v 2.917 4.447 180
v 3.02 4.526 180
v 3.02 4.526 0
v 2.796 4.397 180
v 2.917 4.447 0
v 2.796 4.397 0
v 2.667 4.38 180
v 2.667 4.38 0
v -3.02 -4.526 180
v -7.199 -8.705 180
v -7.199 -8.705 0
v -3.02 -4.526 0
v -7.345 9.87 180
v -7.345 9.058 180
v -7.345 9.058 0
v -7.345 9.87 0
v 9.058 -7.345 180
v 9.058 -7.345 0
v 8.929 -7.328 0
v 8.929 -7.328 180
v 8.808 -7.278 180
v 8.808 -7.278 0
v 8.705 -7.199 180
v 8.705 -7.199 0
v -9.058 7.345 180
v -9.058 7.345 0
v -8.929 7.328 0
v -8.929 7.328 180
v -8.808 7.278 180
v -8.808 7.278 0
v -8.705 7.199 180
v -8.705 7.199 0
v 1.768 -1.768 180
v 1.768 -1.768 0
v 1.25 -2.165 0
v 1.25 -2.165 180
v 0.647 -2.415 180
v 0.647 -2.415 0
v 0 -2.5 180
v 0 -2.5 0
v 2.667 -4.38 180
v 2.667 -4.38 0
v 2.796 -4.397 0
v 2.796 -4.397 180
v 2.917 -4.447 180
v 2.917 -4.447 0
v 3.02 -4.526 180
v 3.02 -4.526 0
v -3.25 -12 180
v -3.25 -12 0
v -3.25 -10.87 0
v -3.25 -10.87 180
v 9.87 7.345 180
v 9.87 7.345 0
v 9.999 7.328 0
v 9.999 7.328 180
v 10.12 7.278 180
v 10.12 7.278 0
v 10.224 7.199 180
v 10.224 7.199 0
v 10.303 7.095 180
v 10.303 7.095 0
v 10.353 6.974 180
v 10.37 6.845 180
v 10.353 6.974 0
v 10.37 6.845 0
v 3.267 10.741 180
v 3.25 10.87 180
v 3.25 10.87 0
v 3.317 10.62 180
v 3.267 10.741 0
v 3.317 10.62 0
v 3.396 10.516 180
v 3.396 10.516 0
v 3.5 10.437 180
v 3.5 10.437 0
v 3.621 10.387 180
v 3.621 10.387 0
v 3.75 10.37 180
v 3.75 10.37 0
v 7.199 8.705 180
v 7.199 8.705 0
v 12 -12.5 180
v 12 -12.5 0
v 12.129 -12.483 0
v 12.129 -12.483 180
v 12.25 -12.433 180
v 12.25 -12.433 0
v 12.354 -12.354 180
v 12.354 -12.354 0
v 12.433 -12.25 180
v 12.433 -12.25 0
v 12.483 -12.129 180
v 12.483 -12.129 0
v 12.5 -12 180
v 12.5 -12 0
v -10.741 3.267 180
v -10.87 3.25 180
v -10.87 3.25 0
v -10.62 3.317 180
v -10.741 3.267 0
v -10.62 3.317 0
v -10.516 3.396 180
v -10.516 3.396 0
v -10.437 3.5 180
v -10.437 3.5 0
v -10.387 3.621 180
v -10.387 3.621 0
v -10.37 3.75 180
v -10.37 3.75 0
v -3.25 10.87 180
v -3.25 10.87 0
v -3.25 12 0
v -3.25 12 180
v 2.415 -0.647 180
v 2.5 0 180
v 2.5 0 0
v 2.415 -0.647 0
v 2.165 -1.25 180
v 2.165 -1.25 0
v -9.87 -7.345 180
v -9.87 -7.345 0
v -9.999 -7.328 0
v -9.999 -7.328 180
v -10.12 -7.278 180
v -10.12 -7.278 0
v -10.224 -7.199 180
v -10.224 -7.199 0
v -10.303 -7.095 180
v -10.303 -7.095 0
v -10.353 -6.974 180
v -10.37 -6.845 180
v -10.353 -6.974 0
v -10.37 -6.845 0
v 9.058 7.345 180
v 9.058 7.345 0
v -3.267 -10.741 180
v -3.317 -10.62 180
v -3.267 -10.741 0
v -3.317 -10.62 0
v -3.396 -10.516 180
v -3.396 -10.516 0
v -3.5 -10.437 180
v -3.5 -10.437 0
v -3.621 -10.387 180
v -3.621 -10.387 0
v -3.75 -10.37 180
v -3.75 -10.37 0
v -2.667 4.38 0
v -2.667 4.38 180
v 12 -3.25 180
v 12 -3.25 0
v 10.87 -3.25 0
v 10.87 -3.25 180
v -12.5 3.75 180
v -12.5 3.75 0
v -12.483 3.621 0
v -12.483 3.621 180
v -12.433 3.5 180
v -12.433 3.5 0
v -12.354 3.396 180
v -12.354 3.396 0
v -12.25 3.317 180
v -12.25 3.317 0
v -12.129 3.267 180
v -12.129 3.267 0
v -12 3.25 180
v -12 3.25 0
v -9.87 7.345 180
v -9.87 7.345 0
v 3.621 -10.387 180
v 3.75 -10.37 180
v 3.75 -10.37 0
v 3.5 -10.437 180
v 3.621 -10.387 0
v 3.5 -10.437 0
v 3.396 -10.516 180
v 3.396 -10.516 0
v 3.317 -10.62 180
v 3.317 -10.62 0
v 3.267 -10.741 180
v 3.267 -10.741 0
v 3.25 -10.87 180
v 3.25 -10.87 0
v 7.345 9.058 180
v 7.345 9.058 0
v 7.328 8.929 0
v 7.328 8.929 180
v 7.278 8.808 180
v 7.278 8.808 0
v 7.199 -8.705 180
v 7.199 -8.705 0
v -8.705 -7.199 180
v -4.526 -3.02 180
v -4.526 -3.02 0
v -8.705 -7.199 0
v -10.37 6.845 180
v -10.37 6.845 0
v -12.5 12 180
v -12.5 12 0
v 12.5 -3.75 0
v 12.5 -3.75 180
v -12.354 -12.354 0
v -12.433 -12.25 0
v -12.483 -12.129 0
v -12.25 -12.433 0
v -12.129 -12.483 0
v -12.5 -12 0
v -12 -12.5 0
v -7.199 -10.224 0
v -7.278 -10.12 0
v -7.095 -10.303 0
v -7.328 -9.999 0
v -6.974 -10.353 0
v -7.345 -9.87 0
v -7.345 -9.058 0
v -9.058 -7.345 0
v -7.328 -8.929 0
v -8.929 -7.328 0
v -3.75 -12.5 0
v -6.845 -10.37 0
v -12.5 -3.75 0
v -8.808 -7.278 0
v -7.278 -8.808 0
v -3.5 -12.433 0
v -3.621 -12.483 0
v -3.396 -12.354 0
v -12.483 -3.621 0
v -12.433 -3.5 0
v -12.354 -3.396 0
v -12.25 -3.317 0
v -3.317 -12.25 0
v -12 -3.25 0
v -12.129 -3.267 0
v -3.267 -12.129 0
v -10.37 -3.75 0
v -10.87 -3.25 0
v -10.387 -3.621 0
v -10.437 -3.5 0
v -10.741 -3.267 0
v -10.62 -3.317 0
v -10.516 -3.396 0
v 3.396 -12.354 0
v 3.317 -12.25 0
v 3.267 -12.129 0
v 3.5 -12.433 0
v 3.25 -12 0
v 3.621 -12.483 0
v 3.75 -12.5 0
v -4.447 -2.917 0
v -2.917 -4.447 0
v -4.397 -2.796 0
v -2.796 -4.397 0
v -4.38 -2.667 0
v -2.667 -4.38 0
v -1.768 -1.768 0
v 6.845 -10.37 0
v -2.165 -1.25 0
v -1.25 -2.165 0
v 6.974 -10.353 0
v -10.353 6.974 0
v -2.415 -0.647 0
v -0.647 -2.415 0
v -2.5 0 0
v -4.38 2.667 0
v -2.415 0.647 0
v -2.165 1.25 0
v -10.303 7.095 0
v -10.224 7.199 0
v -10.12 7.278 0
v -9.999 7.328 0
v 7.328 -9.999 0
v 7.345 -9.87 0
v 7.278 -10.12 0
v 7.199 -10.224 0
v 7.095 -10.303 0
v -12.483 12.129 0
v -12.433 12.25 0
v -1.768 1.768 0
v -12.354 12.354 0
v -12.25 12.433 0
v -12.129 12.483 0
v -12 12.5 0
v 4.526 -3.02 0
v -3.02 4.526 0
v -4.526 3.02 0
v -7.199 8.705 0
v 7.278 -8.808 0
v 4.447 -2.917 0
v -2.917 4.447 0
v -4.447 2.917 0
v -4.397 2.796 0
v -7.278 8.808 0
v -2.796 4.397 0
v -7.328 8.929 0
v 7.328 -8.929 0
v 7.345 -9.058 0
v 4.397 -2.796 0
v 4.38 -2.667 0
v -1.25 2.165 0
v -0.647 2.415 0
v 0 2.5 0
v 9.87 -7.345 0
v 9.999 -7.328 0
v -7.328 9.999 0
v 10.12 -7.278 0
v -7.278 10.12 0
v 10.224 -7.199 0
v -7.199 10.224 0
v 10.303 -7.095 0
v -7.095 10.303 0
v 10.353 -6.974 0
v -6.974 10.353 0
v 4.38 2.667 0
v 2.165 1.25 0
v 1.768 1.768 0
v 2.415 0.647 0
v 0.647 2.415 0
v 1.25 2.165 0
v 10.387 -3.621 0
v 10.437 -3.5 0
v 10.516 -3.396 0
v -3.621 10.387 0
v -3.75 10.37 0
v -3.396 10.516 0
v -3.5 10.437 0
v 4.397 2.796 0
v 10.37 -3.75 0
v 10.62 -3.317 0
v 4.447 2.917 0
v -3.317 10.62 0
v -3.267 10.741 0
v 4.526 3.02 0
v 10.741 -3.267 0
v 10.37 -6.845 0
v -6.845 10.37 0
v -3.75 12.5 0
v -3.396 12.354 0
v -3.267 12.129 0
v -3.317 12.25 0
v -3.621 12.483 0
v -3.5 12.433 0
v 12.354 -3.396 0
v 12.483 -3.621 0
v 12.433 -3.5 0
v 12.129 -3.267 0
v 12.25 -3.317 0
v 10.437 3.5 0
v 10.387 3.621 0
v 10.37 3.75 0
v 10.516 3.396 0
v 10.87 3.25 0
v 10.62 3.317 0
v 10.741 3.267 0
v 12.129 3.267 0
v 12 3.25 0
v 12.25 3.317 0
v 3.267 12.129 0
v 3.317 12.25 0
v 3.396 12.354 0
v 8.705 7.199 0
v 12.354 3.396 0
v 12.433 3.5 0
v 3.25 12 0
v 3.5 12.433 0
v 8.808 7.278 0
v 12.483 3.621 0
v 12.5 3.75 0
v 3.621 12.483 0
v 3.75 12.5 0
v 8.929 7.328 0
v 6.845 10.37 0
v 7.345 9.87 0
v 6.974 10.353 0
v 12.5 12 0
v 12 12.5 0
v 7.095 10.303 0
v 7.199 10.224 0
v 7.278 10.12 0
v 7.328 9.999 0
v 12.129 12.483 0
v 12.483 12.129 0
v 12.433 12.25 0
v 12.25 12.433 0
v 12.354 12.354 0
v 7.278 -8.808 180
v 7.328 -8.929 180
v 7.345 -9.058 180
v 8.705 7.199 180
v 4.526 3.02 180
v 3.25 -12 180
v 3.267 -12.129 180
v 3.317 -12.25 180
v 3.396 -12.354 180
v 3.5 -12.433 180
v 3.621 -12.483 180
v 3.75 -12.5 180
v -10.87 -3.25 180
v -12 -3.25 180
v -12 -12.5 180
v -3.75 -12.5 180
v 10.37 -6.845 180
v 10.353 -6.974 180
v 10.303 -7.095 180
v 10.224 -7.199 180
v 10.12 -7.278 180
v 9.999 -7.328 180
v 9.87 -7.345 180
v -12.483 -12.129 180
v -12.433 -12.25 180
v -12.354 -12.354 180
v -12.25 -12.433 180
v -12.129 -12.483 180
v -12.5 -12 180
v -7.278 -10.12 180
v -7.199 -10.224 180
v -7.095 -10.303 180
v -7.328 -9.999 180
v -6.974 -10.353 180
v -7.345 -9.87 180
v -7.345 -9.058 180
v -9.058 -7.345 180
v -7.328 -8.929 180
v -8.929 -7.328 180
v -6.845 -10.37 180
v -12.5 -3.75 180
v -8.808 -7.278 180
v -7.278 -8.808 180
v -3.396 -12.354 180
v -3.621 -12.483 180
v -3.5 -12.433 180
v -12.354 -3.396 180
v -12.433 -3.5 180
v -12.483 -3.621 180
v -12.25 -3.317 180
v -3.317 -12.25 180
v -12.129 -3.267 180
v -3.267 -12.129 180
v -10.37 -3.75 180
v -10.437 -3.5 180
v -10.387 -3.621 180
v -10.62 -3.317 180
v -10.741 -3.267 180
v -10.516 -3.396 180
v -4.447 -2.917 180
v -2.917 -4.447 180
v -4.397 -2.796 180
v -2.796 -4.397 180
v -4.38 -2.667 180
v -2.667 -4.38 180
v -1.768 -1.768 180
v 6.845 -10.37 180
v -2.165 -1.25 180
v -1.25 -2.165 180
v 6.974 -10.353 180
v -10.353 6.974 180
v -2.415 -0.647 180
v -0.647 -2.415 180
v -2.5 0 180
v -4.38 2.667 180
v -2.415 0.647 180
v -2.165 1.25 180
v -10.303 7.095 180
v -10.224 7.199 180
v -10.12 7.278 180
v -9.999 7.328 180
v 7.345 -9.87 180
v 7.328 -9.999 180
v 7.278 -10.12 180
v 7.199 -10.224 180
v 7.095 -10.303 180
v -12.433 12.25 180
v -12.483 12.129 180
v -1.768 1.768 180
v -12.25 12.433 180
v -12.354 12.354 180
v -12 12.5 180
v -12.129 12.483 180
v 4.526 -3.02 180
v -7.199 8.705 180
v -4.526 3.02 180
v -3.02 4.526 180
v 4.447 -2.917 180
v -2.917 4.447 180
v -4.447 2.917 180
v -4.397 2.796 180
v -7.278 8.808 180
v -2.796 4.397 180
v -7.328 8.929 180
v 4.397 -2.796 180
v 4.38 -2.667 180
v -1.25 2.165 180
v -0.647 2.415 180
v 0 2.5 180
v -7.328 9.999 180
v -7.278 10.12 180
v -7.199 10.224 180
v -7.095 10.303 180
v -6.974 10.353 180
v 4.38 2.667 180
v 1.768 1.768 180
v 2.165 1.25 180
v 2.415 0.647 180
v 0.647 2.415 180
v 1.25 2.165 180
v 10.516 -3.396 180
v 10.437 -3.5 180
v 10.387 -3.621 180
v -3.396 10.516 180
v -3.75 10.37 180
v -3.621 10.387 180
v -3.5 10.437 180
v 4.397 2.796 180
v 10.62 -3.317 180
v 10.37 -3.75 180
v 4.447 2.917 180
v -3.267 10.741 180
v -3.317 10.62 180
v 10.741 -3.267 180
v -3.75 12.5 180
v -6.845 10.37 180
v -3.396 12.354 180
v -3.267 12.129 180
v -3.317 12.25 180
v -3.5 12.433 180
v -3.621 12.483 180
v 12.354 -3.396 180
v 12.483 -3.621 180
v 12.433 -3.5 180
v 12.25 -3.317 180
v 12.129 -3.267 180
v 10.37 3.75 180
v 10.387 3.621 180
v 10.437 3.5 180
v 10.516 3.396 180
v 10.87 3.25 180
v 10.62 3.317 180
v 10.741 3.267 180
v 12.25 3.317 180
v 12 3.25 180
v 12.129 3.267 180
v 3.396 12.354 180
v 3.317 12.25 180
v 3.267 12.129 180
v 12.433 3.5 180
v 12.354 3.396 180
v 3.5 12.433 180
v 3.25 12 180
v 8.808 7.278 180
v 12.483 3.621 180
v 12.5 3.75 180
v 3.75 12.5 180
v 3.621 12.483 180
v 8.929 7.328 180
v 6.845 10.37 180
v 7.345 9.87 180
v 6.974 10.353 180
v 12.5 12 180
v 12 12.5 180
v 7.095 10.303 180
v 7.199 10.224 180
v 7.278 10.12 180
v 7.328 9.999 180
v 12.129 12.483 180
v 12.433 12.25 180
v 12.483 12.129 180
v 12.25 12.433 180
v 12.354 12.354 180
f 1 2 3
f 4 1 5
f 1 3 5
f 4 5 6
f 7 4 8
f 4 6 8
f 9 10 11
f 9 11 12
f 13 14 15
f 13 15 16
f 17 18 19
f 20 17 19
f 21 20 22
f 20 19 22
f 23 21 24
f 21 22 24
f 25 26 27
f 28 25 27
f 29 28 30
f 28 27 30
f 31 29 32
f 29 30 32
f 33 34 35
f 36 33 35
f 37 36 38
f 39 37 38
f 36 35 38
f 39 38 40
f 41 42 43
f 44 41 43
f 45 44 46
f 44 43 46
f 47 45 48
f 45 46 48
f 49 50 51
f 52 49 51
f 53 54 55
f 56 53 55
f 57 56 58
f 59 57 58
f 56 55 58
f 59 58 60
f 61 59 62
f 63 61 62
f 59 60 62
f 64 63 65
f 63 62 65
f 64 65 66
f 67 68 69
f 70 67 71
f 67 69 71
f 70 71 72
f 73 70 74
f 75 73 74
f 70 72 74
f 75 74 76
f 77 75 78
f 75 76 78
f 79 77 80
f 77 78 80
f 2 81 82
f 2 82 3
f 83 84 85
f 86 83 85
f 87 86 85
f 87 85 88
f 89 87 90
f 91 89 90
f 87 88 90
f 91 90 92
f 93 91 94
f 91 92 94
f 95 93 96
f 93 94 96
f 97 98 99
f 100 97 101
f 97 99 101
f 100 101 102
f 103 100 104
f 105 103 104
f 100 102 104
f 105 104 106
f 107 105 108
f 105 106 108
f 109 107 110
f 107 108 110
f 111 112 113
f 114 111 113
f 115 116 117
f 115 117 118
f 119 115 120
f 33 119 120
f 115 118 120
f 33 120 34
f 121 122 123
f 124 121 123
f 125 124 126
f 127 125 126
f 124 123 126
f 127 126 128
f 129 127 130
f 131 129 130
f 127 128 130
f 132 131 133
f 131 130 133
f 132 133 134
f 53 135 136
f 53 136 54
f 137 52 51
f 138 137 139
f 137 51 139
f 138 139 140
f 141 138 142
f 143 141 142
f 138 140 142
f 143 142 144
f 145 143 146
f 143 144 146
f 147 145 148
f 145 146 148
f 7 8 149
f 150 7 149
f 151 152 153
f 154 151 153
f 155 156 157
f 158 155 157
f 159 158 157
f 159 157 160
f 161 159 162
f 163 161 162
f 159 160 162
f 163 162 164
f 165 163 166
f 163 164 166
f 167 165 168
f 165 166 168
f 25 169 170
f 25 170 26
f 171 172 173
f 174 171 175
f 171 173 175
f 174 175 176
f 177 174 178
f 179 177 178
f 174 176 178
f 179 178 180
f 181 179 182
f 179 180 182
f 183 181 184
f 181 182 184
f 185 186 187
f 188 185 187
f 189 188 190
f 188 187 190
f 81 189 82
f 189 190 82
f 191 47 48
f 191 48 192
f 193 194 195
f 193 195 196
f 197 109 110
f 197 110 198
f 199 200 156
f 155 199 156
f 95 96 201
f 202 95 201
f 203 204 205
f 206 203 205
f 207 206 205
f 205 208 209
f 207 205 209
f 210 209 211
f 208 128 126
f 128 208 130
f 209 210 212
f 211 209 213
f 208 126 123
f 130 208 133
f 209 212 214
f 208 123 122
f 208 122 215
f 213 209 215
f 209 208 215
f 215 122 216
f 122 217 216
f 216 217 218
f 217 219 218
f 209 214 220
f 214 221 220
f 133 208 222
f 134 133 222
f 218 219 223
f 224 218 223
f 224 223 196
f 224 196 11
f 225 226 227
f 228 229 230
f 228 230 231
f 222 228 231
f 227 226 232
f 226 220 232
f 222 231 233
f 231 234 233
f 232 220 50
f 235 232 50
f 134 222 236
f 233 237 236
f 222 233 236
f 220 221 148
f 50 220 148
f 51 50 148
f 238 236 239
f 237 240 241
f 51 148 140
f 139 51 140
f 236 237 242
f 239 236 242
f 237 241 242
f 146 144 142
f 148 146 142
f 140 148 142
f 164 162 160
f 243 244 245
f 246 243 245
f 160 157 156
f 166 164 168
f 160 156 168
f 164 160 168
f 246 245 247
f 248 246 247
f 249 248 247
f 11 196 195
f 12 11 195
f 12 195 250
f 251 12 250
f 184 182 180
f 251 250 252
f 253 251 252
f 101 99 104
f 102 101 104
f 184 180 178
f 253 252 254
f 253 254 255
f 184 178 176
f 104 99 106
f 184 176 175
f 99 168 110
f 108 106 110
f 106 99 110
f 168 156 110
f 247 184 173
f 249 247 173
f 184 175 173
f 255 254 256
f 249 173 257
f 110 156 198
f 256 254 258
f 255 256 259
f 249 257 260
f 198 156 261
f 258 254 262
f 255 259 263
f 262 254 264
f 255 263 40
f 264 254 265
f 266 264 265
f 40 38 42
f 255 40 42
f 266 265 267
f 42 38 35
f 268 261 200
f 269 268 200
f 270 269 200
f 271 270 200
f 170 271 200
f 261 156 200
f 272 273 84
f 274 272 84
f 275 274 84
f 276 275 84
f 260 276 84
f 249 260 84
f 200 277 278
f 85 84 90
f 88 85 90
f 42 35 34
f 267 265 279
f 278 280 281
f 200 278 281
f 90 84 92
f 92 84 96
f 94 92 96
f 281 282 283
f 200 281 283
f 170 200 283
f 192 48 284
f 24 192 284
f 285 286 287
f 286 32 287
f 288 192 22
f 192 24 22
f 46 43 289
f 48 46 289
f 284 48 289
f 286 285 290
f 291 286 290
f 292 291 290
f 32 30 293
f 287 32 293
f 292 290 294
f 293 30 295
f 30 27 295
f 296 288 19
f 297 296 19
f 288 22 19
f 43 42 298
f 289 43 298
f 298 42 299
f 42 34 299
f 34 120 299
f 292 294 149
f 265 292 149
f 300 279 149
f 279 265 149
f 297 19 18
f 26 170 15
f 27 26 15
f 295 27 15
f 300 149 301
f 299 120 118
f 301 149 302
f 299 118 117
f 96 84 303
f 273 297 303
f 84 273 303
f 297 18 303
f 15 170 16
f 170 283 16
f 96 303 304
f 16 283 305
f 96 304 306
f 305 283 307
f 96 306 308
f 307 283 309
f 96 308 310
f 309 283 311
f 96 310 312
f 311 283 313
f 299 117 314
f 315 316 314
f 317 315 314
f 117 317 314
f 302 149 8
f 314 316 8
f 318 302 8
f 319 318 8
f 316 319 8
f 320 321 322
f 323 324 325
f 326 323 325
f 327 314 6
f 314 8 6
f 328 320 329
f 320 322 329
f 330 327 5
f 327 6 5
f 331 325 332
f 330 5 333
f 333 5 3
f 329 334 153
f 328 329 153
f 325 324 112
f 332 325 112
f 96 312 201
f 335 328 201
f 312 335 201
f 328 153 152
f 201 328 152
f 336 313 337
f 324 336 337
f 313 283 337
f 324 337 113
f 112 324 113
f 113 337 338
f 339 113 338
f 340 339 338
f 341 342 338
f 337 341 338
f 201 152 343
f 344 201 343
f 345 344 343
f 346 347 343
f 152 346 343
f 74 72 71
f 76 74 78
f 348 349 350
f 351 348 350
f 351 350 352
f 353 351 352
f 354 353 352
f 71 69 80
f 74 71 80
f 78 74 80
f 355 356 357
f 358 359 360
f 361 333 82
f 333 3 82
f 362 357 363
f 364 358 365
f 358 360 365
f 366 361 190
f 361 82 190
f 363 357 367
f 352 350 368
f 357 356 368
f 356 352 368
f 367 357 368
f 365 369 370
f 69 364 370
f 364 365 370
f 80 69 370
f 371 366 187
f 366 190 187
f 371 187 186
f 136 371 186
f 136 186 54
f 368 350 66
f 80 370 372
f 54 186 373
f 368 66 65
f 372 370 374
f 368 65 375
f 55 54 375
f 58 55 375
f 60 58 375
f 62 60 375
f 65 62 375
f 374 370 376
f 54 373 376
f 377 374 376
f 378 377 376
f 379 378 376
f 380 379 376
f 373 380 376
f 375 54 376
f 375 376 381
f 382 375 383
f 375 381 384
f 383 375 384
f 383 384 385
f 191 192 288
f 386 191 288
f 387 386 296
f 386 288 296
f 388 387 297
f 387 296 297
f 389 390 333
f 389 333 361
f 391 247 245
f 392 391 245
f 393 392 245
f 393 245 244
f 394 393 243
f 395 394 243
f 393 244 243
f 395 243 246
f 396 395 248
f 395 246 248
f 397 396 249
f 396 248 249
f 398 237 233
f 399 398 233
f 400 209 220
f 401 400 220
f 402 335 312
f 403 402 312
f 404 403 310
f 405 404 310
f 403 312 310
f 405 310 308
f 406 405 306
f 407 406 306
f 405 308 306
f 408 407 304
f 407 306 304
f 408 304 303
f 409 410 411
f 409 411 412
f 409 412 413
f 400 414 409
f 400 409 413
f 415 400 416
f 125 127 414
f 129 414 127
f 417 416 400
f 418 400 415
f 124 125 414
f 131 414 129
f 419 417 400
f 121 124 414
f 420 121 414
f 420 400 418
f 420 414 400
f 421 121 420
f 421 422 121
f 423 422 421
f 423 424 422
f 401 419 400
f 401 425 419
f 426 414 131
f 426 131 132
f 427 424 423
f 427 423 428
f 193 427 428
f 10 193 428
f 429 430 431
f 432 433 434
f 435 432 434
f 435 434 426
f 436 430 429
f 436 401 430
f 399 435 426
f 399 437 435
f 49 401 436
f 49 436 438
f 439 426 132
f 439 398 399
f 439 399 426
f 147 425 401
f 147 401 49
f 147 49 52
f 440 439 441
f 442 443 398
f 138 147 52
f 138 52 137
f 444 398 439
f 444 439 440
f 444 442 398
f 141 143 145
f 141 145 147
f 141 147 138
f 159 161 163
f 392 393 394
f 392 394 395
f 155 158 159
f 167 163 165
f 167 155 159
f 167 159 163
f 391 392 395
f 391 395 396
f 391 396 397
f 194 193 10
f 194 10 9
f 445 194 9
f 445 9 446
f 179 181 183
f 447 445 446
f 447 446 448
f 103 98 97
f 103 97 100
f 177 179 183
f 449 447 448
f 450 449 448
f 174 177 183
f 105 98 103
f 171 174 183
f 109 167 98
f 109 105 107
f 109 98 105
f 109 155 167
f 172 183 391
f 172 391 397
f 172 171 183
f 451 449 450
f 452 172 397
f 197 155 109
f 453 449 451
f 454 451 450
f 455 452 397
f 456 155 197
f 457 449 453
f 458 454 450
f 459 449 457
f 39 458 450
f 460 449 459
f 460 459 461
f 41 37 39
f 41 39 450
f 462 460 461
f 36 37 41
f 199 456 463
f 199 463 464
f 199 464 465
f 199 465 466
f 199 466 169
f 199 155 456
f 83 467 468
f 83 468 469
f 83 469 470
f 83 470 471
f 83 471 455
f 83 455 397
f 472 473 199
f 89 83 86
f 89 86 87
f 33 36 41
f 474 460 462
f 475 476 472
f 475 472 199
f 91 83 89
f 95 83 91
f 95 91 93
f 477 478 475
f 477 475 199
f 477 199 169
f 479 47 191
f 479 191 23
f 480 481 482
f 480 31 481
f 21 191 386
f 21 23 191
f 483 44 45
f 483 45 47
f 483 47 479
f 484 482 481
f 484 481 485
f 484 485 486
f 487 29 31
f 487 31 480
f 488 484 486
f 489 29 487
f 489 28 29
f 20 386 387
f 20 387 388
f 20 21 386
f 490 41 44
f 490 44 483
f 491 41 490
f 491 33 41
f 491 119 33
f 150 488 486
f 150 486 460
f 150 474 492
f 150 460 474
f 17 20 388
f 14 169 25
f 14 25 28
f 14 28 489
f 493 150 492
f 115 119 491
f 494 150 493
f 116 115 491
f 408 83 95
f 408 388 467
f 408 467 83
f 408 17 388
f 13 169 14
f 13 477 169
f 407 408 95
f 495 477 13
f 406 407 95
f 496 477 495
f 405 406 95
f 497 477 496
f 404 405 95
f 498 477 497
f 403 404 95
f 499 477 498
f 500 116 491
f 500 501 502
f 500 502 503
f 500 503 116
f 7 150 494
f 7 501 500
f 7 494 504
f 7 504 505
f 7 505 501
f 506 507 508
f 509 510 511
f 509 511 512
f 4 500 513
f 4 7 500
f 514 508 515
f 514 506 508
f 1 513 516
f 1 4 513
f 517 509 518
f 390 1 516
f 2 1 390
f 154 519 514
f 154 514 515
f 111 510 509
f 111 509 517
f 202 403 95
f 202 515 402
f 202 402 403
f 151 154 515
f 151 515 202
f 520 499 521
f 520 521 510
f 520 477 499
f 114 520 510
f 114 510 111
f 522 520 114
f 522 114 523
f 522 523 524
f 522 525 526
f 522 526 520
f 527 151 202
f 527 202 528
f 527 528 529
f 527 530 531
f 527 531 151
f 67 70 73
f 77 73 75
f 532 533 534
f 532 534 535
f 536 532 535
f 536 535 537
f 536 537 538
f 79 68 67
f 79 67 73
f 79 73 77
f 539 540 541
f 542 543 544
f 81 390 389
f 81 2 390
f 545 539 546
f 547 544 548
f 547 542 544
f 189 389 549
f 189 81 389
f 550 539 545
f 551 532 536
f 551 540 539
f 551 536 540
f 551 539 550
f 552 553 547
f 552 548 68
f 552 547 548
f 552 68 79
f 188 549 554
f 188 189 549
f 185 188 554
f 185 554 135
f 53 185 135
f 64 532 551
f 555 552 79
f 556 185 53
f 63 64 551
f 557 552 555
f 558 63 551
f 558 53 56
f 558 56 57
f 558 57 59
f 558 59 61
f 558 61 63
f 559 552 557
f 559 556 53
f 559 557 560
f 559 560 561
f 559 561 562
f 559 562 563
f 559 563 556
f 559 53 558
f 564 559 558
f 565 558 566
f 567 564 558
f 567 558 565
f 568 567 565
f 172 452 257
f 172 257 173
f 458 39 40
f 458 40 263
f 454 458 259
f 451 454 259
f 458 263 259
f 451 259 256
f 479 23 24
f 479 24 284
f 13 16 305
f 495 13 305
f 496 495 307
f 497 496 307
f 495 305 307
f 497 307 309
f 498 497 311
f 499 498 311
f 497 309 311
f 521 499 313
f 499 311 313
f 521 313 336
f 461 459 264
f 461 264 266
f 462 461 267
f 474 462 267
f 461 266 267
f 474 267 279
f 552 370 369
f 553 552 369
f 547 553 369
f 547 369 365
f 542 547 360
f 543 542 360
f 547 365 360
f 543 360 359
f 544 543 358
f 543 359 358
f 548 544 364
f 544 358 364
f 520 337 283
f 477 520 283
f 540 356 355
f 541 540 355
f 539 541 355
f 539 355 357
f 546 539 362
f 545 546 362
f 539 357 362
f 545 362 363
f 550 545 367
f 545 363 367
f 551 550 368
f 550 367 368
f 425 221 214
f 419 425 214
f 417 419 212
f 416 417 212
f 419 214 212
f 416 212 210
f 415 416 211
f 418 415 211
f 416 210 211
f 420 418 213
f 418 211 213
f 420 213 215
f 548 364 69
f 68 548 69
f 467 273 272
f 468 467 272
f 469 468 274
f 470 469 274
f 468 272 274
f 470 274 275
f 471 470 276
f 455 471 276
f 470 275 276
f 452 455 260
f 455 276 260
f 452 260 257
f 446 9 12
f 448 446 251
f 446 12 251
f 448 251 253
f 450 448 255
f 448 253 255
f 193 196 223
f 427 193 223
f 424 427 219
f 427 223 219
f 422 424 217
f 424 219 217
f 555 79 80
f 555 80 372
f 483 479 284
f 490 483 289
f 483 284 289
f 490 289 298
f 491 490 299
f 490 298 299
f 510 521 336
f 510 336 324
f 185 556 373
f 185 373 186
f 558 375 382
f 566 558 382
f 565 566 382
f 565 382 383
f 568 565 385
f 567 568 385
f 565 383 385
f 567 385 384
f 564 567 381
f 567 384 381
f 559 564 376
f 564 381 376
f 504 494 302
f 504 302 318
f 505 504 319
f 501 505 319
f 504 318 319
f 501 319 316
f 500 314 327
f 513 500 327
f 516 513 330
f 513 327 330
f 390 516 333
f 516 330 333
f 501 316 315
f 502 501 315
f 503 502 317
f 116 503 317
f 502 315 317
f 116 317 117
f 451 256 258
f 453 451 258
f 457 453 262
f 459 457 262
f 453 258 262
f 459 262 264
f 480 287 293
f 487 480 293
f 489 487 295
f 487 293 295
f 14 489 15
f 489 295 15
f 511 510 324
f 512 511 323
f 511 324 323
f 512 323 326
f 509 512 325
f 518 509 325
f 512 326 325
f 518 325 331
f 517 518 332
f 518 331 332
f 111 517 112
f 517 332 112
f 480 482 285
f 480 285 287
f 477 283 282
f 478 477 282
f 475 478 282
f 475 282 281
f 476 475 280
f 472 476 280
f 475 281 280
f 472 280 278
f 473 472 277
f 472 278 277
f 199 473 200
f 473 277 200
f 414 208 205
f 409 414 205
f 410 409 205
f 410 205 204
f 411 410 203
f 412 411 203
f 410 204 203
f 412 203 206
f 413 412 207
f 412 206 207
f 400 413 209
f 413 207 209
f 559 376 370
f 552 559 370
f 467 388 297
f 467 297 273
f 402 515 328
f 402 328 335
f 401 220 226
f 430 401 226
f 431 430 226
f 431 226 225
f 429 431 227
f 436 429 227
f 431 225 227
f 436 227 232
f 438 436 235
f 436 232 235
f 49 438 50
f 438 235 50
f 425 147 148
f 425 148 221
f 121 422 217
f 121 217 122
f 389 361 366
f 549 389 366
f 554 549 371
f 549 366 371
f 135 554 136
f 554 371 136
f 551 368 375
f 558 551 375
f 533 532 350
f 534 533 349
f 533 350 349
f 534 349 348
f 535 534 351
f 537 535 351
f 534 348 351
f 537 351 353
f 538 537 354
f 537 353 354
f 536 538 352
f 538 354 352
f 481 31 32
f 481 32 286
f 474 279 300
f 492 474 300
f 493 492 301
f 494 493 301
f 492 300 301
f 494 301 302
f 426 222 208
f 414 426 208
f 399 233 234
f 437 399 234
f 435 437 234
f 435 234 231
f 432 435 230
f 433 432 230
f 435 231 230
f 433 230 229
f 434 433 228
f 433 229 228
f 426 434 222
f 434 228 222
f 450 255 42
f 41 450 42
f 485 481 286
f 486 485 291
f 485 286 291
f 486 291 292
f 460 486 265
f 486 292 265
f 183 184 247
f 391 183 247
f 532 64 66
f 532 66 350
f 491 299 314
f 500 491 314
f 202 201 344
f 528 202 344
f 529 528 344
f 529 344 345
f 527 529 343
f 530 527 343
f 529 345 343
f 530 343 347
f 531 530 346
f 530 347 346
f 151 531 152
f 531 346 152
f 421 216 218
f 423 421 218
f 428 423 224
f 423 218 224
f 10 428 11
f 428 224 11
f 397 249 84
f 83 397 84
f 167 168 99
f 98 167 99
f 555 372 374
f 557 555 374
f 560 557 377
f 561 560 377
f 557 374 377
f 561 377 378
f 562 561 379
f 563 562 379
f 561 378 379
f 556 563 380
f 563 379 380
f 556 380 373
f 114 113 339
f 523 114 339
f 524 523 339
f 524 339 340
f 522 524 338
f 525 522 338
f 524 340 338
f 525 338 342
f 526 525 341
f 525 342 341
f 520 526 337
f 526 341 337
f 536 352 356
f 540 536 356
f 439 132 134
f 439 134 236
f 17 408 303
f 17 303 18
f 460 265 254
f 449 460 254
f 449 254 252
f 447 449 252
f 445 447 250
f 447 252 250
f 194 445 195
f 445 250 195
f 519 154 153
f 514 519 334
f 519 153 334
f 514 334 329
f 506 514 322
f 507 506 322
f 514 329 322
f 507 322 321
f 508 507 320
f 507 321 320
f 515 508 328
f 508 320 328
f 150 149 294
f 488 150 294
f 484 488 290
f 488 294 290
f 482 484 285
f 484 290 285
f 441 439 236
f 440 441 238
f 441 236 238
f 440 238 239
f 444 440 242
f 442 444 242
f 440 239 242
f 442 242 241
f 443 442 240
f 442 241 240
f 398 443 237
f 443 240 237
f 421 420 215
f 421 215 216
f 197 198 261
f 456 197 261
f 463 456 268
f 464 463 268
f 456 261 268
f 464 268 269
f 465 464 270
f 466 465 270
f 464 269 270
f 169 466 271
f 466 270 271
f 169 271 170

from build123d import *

# Parameters (mm, degrees)
F1_DEPTH = 180


with BuildPart() as f1:
    # F0 (on Top) → F1 (new body)
    with BuildSketch(Plane.XY):
        with BuildLine():
            Line((-3.75, 12.5), (-12, 12.5))
            ThreePointArc((-12, 12.5), (-12.353553, 12.353553), (-12.5, 12))
            Line((-12.5, 12), (-12.5, 3.75))
            ThreePointArc((-12.5, 3.75), (-12.353553, 3.396447), (-12, 3.25))
            Line((-12, 3.25), (-10.87, 3.25))
            ThreePointArc((-10.87, 3.25), (-10.516447, 3.396447), (-10.37, 3.75))
            Line((-10.37, 3.75), (-10.37, 6.845))
            ThreePointArc((-10.37, 6.845), (-10.223553, 7.198553), (-9.87, 7.345))
            Line((-9.87, 7.345), (-9.058244, 7.345))
            ThreePointArc((-9.058244, 7.345), (-8.866903, 7.30694), (-8.704691, 7.198553))
            Line((-8.704691, 7.198553), (-4.526447, 3.020309))
            ThreePointArc((-4.526447, 3.020309), (-4.41806, 2.858097), (-4.38, 2.666756))
            Line((-4.38, 2.666756), (-4.38, 0))
            Line((-4.38, 0), (-4.38, -2.666756))
            ThreePointArc((-4.38, -2.666756), (-4.41806, -2.858097), (-4.526447, -3.020309))
            Line((-4.526447, -3.020309), (-8.704691, -7.198553))
            ThreePointArc((-8.704691, -7.198553), (-8.866903, -7.30694), (-9.058244, -7.345))
            Line((-9.058244, -7.345), (-9.87, -7.345))
            ThreePointArc((-9.87, -7.345), (-10.223553, -7.198553), (-10.37, -6.845))
            Line((-10.37, -6.845), (-10.37, -3.75))
            ThreePointArc((-10.37, -3.75), (-10.516447, -3.396447), (-10.87, -3.25))
            Line((-10.87, -3.25), (-12, -3.25))
            ThreePointArc((-12, -3.25), (-12.353553, -3.396447), (-12.5, -3.75))
            Line((-12.5, -3.75), (-12.5, -12))
            ThreePointArc((-12.5, -12), (-12.353553, -12.353553), (-12, -12.5))
            Line((-12, -12.5), (-3.75, -12.5))
            ThreePointArc((-3.75, -12.5), (-3.396447, -12.353553), (-3.25, -12))
            Line((-3.25, -12), (-3.25, -10.87))
            ThreePointArc((-3.25, -10.87), (-3.396447, -10.516447), (-3.75, -10.37))
            Line((-3.75, -10.37), (-6.845, -10.37))
            ThreePointArc((-6.845, -10.37), (-7.198553, -10.223553), (-7.345, -9.87))
            Line((-7.345, -9.87), (-7.345, -9.058244))
            ThreePointArc((-7.345, -9.058244), (-7.30694, -8.866903), (-7.198553, -8.704691))
            Line((-7.198553, -8.704691), (-3.020309, -4.526447))
            ThreePointArc((-3.020309, -4.526447), (-2.858097, -4.41806), (-2.666756, -4.38))
            Line((-2.666756, -4.38), (0, -4.38))
            Line((0, -4.38), (2.666756, -4.38))
            ThreePointArc((2.666756, -4.38), (2.858097, -4.41806), (3.020309, -4.526447))
            Line((3.020309, -4.526447), (7.198553, -8.704691))
            ThreePointArc((7.198553, -8.704691), (7.30694, -8.866903), (7.345, -9.058244))
            Line((7.345, -9.058244), (7.345, -9.87))
            ThreePointArc((7.345, -9.87), (7.198553, -10.223553), (6.845, -10.37))
            Line((6.845, -10.37), (3.75, -10.37))
            ThreePointArc((3.75, -10.37), (3.396447, -10.516447), (3.25, -10.87))
            Line((3.25, -10.87), (3.25, -12))
            ThreePointArc((3.25, -12), (3.396447, -12.353553), (3.75, -12.5))
            Line((3.75, -12.5), (12, -12.5))
            ThreePointArc((12, -12.5), (12.353553, -12.353553), (12.5, -12))
            Line((12.5, -12), (12.5, -3.75))
            ThreePointArc((12.5, -3.75), (12.353553, -3.396447), (12, -3.25))
            Line((12, -3.25), (10.87, -3.25))
            ThreePointArc((10.87, -3.25), (10.516447, -3.396447), (10.37, -3.75))
            Line((10.37, -3.75), (10.37, -6.845))
            ThreePointArc((10.37, -6.845), (10.223553, -7.198553), (9.87, -7.345))
            Line((9.87, -7.345), (9.058244, -7.345))
            ThreePointArc((9.058244, -7.345), (8.866903, -7.30694), (8.704691, -7.198553))
            Line((8.704691, -7.198553), (4.526447, -3.020309))
            ThreePointArc((4.526447, -3.020309), (4.41806, -2.858097), (4.38, -2.666756))
            Line((4.38, -2.666756), (4.38, 0))
            Line((4.38, 0), (4.38, 2.666756))
            ThreePointArc((4.38, 2.666756), (4.41806, 2.858097), (4.526447, 3.020309))
            Line((4.526447, 3.020309), (8.704691, 7.198553))
            ThreePointArc((8.704691, 7.198553), (8.866903, 7.30694), (9.058244, 7.345))
            Line((9.058244, 7.345), (9.87, 7.345))
            ThreePointArc((9.87, 7.345), (10.223553, 7.198553), (10.37, 6.845))
            Line((10.37, 6.845), (10.37, 3.75))
            ThreePointArc((10.37, 3.75), (10.516447, 3.396447), (10.87, 3.25))
            Line((10.87, 3.25), (12, 3.25))
            ThreePointArc((12, 3.25), (12.353553, 3.396447), (12.5, 3.75))
            Line((12.5, 3.75), (12.5, 12))
            ThreePointArc((12.5, 12), (12.353553, 12.353553), (12, 12.5))
            Line((12, 12.5), (3.75, 12.5))
            ThreePointArc((3.75, 12.5), (3.396447, 12.353553), (3.25, 12))
            Line((3.25, 12), (3.25, 10.87))
            ThreePointArc((3.25, 10.87), (3.396447, 10.516447), (3.75, 10.37))
            Line((3.75, 10.37), (6.845, 10.37))
            ThreePointArc((6.845, 10.37), (7.198553, 10.223553), (7.345, 9.87))
            Line((7.345, 9.87), (7.345, 9.058244))
            ThreePointArc((7.345, 9.058244), (7.30694, 8.866903), (7.198553, 8.704691))
            Line((7.198553, 8.704691), (3.020309, 4.526447))
            ThreePointArc((3.020309, 4.526447), (2.858097, 4.41806), (2.666756, 4.38))
            Line((2.666756, 4.38), (0, 4.38))
            Line((0, 4.38), (-2.666756, 4.38))
            ThreePointArc((-2.666756, 4.38), (-2.858097, 4.41806), (-3.020309, 4.526447))
            Line((-3.020309, 4.526447), (-7.198553, 8.704691))
            ThreePointArc((-7.198553, 8.704691), (-7.30694, 8.866903), (-7.345, 9.058244))
            Line((-7.345, 9.058244), (-7.345, 9.87))
            ThreePointArc((-7.345, 9.87), (-7.198553, 10.223553), (-6.845, 10.37))
            Line((-6.845, 10.37), (-3.75, 10.37))
            ThreePointArc((-3.75, 10.37), (-3.396447, 10.516447), (-3.25, 10.87))
            Line((-3.25, 10.87), (-3.25, 12))
            ThreePointArc((-3.25, 12), (-3.396447, 12.353553), (-3.75, 12.5))
        make_face()
        with BuildLine():
            ThreePointArc((-1.767767, 1.767767), (-0.956709, 2.309699), (0, 2.5))
            ThreePointArc((0, 2.5), (0.956709, 2.309699), (1.767767, 1.767767))
            ThreePointArc((1.767767, 1.767767), (2.309699, 0.956709), (2.5, 0))
            ThreePointArc((2.5, 0), (2.309699, -0.956709), (1.767767, -1.767767))
            ThreePointArc((1.767767, -1.767767), (0.956709, -2.309699), (0, -2.5))
            ThreePointArc((0, -2.5), (-0.956709, -2.309699), (-1.767767, -1.767767))
            ThreePointArc((-1.767767, -1.767767), (-2.309699, -0.956709), (-2.5, 0))
            ThreePointArc((-2.5, 0), (-2.309699, 0.956709), (-1.767767, 1.767767))
        make_face(mode=Mode.SUBTRACT)
    extrude(amount=F1_DEPTH)


solid = f1.part
